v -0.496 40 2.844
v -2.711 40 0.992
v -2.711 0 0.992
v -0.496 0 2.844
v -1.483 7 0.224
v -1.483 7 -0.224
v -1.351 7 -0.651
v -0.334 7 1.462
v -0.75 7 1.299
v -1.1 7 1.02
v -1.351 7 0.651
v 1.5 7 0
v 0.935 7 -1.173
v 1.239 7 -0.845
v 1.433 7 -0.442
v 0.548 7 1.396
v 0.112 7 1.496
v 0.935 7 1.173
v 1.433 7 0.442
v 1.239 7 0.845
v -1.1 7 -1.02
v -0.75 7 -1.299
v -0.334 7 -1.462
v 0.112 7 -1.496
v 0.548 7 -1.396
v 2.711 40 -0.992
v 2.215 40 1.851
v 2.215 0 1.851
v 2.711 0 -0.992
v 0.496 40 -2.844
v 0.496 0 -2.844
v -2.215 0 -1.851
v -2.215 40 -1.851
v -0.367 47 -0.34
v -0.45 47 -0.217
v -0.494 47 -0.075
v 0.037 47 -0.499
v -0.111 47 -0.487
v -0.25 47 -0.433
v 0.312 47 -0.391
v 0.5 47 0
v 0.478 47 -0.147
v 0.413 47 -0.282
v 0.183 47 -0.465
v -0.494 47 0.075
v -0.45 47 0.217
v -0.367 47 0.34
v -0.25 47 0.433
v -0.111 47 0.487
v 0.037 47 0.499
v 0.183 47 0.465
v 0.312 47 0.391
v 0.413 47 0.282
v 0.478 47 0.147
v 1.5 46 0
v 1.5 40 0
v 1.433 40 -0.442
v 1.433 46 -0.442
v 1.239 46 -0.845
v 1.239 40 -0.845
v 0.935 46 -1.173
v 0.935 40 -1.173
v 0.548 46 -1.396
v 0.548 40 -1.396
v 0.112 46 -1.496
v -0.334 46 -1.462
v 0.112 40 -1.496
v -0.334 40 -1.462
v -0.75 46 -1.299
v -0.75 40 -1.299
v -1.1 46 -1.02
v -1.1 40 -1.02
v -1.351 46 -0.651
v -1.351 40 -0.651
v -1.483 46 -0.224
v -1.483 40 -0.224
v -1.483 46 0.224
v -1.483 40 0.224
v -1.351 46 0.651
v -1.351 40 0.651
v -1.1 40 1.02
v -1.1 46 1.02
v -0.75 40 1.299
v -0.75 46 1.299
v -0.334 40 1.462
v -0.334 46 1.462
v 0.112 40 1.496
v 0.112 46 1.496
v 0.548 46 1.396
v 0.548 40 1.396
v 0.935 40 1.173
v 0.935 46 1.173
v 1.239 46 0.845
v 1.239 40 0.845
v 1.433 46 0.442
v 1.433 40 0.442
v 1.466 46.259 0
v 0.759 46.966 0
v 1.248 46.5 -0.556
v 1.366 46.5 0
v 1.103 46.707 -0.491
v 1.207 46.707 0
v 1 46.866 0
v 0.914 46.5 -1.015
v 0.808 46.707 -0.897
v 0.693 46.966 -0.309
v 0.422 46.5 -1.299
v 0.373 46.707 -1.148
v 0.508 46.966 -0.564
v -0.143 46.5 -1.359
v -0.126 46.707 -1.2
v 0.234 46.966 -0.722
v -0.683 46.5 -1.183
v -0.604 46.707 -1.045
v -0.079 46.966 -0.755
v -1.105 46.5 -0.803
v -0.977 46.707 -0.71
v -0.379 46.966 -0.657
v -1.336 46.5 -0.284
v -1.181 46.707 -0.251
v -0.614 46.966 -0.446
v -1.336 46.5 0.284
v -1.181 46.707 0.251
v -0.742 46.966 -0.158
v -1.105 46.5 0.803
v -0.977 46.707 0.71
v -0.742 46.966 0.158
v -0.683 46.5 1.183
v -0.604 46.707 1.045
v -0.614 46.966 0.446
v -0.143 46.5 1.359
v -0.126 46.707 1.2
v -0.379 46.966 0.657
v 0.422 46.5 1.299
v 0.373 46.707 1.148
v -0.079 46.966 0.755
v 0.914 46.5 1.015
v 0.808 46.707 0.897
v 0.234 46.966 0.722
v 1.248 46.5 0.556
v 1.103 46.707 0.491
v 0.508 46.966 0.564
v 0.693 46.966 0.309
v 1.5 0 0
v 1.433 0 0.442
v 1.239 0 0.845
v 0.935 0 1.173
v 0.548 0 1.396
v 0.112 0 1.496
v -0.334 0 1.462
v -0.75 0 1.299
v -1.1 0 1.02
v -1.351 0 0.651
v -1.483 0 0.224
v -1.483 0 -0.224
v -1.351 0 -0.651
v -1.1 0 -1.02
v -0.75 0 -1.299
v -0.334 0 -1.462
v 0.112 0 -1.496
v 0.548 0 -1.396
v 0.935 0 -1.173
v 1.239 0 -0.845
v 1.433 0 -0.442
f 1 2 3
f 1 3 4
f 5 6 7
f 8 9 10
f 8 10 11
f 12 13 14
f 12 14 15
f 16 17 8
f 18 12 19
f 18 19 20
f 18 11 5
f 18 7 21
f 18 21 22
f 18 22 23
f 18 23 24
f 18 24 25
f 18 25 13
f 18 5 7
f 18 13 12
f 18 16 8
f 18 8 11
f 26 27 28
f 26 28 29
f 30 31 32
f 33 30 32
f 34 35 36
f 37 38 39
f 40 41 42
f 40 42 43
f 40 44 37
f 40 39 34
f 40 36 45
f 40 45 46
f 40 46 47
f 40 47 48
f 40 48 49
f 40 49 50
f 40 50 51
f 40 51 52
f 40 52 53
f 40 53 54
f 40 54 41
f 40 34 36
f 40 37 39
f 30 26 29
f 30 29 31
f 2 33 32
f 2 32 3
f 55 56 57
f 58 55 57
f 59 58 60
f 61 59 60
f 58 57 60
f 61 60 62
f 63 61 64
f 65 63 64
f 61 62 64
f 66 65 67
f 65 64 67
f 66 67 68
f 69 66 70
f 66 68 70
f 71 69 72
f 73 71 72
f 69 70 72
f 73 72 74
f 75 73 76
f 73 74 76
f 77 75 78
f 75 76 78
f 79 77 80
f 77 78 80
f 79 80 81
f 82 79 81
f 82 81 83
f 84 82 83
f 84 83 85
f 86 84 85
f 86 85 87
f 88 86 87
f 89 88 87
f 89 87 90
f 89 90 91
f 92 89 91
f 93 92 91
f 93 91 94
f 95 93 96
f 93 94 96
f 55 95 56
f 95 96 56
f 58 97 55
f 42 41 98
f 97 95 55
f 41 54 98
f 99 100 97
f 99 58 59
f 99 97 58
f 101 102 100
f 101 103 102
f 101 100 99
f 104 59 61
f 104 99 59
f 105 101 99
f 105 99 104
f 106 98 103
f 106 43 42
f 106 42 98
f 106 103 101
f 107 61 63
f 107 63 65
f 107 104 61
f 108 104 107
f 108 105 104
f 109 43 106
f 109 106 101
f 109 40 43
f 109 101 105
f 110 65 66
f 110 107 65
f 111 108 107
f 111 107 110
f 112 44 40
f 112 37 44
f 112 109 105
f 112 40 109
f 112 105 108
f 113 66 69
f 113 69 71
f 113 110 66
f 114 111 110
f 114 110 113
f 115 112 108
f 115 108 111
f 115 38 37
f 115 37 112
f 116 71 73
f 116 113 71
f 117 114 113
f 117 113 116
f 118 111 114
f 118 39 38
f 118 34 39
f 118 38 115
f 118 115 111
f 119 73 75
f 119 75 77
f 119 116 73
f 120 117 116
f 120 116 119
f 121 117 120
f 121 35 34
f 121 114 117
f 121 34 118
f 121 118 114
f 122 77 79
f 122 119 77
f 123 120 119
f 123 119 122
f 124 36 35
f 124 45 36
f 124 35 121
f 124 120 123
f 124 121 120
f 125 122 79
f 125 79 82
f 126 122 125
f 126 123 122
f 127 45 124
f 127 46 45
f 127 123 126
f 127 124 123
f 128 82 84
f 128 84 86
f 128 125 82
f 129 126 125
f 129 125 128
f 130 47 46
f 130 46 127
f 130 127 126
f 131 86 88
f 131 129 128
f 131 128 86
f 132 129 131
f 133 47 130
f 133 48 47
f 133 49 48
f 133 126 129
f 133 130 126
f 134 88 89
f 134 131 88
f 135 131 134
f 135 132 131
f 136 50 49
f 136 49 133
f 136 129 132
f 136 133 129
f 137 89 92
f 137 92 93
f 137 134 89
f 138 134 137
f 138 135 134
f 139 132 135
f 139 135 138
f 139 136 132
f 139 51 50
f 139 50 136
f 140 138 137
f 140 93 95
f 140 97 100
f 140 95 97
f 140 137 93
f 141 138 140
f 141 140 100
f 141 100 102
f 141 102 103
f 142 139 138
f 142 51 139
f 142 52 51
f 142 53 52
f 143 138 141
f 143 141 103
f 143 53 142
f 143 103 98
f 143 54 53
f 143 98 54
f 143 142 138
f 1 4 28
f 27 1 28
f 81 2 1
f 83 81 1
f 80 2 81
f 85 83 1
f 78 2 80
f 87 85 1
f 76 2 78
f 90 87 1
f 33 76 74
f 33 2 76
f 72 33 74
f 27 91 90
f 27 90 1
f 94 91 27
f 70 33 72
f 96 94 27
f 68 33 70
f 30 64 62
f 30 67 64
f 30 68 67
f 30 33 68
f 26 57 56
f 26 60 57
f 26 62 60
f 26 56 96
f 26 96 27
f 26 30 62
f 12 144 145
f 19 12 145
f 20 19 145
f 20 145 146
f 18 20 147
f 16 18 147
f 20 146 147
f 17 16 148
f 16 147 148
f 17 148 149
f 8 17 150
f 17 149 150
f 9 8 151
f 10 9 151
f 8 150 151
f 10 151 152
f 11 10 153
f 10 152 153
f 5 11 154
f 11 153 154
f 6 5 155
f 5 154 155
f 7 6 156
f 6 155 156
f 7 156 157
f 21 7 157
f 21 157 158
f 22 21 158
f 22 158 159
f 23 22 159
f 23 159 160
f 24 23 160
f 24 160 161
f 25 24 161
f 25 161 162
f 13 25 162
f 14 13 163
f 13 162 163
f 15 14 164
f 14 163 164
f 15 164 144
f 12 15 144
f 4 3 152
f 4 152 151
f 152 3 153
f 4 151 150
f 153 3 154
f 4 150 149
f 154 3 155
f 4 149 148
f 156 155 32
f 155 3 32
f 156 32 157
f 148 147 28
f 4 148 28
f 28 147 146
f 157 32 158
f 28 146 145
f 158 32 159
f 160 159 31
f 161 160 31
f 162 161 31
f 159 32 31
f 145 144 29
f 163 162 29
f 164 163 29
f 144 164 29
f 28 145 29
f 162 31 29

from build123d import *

# Parameters (mm, degrees)
BOSS_EXTRUDE1_DEPTH = 40
SKETCH2_R           = 1.5
BOSS_EXTRUDE2_DEPTH = 7
SKETCH3_R           = 1.5
CUT_EXTRUDE1_DEPTH  = 7
FILLET1_R           = 1


with BuildPart() as part:
    # Sketch1 → Boss-Extrude1 (new body)
    with BuildSketch(Plane(origin=(0, 0, 0), x_dir=(1, 0, 0), z_dir=(0, 1, 0))):
        Polygon((2.214824591, -1.851454932), (2.7108193, 0.992366895), (0.495994709, 2.843821827), (-2.214824591, 1.851454932), (-2.7108193, -0.992366895), (-0.495994709, -2.843821827), align=None)
    extrude(amount=BOSS_EXTRUDE1_DEPTH)

    # Sketch2 → Boss-Extrude2 (add)
    with BuildSketch(Plane(origin=(0, 40, 0), x_dir=(1, 0, 0), z_dir=(0, 1, 0))):
        Circle(SKETCH2_R)
    extrude(amount=BOSS_EXTRUDE2_DEPTH)

    # Sketch3 → Cut-Extrude1 (cut)
    with BuildSketch(Plane.XZ):
        Circle(SKETCH3_R)
    extrude(amount=-CUT_EXTRUDE1_DEPTH, mode=Mode.SUBTRACT)

    # Fillet1
    fillet1_edges = [part.edges().sort_by_distance(p)[0] for p in [
        (-1.5, 47, 0),
    ]]
    fillet(fillet1_edges, radius=FILLET1_R)


solid = part.part
